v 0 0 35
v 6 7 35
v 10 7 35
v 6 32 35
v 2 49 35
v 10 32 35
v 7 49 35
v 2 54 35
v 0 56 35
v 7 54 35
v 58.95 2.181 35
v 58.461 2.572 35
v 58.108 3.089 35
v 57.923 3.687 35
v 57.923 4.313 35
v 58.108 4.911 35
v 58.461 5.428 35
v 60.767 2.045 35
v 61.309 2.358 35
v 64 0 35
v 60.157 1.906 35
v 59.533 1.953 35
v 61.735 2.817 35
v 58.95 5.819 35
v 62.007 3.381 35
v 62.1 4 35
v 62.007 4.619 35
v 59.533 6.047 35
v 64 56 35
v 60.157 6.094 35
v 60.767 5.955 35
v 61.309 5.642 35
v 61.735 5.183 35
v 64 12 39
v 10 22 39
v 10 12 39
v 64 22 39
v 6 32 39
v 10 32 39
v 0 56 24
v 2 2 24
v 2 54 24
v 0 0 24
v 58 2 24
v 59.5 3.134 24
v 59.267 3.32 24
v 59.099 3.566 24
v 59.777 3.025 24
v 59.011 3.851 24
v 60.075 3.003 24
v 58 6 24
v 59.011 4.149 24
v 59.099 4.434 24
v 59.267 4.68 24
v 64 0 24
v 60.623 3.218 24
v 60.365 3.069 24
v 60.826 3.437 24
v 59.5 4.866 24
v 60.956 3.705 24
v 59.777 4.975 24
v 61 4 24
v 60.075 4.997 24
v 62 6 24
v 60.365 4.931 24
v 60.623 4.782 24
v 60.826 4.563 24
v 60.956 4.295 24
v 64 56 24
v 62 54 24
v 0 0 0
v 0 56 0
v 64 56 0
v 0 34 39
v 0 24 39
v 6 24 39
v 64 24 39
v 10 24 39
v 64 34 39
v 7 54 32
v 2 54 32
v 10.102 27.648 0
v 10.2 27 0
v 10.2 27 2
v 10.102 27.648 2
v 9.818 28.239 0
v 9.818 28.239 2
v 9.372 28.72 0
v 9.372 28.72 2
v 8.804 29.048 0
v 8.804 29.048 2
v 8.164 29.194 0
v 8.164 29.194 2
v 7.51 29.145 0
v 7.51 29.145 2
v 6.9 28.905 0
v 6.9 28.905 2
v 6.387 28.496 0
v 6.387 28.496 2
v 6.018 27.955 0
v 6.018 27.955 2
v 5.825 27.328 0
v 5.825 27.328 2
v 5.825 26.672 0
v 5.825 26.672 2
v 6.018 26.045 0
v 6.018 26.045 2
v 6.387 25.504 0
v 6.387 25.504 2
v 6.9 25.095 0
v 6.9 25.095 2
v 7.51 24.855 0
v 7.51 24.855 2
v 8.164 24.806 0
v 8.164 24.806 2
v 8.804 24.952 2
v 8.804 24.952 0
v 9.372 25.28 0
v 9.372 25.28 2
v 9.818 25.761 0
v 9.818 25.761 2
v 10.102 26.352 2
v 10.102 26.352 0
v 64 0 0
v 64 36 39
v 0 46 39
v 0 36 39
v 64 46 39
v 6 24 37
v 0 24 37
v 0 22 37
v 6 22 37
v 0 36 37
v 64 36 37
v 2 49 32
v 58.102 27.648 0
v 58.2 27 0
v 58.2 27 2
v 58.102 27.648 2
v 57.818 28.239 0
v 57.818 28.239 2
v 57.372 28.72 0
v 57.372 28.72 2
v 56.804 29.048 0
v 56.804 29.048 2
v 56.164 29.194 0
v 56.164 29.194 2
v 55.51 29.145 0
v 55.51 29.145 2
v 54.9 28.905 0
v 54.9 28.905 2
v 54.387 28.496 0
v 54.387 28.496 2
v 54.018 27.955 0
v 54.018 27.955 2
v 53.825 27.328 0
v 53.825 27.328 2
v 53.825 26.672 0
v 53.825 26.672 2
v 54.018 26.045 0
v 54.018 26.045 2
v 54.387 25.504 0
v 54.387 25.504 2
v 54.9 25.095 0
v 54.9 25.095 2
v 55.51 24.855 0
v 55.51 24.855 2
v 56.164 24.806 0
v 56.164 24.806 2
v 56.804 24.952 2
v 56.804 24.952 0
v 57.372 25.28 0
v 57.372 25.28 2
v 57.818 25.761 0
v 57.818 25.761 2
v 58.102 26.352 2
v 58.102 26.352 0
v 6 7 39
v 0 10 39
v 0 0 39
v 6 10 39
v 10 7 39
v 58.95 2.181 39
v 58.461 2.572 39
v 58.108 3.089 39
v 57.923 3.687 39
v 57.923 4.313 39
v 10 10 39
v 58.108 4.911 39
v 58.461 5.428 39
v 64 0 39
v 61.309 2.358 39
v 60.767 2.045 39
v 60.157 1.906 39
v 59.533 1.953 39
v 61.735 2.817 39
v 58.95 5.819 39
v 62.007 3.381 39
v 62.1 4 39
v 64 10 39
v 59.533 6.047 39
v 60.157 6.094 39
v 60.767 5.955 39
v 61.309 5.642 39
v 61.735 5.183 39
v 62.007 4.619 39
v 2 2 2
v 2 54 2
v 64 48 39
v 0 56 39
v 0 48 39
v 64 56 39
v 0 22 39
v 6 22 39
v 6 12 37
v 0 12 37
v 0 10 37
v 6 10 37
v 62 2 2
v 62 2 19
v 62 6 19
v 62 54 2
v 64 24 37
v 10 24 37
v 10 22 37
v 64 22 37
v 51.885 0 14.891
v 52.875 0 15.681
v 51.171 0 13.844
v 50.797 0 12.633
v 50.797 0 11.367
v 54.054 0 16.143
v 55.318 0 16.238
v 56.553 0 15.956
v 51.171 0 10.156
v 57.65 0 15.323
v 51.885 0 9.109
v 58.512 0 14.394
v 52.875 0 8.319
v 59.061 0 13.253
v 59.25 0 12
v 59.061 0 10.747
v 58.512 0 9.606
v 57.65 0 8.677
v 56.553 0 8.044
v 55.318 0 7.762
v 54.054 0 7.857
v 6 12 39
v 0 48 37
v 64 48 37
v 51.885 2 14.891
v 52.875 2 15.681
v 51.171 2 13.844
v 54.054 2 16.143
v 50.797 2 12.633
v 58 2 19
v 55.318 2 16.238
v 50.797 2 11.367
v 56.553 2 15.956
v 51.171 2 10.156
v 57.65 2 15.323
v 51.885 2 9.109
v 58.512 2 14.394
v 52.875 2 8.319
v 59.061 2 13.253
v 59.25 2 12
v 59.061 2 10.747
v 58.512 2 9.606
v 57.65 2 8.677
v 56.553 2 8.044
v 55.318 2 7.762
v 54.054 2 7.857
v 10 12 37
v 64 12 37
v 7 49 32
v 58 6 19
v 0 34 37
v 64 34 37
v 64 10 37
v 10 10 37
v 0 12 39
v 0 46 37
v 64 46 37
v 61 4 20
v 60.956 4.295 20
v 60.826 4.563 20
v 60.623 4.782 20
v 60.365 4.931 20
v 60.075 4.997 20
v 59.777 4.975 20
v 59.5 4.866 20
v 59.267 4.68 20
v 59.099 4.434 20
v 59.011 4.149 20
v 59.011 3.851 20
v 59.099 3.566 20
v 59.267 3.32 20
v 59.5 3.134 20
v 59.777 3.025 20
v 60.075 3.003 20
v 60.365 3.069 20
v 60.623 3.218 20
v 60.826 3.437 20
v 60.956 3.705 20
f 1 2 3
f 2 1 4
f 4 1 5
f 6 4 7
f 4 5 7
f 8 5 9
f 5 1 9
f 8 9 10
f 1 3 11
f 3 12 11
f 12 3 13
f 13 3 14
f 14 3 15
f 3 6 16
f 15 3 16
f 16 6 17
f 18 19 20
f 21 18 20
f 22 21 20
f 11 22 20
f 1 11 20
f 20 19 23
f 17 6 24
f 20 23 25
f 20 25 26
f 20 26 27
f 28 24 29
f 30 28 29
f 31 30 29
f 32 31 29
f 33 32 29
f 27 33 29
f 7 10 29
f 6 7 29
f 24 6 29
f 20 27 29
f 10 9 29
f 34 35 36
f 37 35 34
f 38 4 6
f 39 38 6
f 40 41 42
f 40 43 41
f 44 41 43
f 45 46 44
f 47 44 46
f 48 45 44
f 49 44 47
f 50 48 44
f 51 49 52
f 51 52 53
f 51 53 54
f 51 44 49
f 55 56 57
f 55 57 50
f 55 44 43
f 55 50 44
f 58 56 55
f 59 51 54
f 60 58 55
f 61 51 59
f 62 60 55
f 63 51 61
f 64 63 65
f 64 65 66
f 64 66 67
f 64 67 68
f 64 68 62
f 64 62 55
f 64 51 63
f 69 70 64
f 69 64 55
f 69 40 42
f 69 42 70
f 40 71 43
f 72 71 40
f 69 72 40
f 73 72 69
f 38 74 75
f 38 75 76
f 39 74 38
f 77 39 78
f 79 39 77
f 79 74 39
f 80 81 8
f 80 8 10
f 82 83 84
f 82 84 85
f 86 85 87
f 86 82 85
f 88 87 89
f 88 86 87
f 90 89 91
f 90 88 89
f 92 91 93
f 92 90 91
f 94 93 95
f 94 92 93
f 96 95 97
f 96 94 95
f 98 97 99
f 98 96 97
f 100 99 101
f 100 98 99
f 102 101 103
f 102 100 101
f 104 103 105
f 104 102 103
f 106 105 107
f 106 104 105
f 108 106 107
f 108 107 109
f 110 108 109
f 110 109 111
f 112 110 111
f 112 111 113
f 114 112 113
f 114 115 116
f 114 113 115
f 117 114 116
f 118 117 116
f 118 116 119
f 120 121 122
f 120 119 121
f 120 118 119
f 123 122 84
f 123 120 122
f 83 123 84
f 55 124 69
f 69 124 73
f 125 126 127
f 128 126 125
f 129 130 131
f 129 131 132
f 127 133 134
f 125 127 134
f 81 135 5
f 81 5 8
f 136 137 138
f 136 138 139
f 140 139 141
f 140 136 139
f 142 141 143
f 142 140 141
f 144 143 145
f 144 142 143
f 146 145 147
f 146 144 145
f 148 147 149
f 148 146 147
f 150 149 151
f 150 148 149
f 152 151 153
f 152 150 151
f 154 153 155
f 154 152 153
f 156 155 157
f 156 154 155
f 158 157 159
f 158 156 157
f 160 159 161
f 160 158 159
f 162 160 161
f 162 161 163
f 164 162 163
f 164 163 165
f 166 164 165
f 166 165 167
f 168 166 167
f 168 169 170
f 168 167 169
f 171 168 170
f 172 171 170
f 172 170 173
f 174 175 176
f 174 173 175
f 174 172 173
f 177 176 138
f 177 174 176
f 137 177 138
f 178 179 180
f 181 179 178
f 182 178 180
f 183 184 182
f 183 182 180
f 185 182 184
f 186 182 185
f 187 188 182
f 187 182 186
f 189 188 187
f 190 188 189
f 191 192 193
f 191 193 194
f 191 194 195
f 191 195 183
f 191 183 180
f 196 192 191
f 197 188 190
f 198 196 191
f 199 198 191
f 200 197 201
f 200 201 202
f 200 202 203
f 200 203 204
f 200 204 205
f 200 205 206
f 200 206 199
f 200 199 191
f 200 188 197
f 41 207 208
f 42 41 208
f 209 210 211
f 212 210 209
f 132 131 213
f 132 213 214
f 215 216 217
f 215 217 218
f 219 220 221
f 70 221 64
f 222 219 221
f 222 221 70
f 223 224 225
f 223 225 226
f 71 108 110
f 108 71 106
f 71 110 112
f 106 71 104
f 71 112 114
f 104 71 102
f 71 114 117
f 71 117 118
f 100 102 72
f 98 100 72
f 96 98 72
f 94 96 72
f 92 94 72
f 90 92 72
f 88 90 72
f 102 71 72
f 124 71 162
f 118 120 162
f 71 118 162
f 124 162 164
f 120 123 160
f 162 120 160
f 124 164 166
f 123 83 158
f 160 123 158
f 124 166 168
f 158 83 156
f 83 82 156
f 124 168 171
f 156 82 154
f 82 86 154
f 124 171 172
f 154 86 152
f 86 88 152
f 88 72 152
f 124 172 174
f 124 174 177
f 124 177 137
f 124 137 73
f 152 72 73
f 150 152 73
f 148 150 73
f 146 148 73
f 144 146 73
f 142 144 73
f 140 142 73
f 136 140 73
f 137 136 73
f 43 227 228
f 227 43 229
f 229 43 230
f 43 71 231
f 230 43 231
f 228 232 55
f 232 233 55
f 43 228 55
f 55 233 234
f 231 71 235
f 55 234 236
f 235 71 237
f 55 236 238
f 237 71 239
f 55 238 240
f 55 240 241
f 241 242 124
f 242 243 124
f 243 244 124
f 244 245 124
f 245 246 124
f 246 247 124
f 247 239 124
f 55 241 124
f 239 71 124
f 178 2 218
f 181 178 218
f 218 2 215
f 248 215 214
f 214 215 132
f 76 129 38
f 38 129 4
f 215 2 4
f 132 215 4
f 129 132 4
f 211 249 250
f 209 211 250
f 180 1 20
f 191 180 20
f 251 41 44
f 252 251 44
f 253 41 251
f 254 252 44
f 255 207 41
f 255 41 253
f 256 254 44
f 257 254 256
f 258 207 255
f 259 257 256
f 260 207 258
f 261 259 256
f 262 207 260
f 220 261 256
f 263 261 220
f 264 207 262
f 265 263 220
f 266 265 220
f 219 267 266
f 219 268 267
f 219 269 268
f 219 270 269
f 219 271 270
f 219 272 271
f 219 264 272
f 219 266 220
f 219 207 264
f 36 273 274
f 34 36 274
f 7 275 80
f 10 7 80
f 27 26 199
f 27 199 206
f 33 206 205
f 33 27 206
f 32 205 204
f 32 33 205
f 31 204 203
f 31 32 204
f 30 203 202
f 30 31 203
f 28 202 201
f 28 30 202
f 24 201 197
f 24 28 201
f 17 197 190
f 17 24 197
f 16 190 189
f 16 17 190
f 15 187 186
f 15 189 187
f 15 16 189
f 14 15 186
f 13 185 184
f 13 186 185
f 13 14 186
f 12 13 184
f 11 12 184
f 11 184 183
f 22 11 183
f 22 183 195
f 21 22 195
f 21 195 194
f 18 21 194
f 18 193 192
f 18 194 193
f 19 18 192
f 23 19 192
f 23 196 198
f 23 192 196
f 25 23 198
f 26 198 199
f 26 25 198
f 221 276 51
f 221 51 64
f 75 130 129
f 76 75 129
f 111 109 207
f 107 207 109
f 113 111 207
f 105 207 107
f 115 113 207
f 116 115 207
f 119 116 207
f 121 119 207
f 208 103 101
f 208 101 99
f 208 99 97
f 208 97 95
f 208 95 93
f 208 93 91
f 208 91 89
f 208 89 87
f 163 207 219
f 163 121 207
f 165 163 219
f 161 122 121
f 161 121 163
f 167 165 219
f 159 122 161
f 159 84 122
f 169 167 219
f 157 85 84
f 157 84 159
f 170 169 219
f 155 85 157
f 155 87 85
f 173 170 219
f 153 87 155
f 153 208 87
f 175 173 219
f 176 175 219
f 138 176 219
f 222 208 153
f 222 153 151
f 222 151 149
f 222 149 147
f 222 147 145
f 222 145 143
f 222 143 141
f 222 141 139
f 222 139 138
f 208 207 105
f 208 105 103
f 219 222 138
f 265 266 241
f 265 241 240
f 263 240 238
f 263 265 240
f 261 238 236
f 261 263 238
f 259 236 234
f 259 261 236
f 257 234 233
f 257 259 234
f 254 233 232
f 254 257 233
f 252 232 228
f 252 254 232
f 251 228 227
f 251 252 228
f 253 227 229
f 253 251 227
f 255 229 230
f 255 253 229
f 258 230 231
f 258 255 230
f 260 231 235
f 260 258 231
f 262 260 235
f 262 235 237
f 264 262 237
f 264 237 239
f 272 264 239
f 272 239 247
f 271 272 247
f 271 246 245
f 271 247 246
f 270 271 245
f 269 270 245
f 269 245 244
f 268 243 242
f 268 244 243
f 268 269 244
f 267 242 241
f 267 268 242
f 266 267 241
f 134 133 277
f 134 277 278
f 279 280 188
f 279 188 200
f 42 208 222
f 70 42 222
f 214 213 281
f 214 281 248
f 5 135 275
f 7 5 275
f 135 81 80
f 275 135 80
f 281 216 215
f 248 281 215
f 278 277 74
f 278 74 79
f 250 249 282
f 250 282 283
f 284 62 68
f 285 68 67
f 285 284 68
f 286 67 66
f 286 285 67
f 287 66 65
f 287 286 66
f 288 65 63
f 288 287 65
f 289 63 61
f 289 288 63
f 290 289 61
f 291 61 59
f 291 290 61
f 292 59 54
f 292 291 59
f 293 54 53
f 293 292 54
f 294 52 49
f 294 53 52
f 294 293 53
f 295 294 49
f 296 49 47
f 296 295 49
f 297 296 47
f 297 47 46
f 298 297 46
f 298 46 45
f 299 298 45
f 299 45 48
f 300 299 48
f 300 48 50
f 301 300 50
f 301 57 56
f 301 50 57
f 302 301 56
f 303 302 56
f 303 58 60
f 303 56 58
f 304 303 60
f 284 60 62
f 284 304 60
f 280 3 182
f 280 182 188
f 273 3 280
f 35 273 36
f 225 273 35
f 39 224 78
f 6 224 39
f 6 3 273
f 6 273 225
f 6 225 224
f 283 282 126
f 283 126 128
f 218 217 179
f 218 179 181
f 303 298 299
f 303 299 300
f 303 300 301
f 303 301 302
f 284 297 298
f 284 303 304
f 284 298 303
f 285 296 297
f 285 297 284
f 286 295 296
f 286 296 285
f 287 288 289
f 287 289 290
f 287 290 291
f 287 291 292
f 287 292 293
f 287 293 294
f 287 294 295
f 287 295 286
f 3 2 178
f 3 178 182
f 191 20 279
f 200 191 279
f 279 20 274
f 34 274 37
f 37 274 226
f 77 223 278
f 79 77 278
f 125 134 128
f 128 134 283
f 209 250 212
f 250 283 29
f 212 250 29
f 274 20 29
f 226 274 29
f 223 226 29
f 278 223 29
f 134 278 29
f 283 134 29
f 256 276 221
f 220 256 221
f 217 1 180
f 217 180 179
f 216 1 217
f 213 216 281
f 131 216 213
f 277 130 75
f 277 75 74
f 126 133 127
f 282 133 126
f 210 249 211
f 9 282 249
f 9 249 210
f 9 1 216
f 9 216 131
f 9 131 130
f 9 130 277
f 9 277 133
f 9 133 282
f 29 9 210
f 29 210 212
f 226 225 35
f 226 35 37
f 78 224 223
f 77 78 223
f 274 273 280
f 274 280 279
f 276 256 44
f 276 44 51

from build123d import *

# Parameters (mm, degrees)
CYLINDER001_R     = 2.1
CYLINDER001_DEPTH = 10
BOX005_W          = 4
BOX005_H          = 25
BOX005_DEPTH      = 10
BOX006_W          = 64
BOX006_H          = 10
BOX006_DEPTH      = 2
BOX007_W          = 64
BOX007_H          = 8
BOX007_DEPTH      = 2
BOX008_W          = 64
BOX008_H          = 10
BOX008_DEPTH      = 2
BOX009_W          = 64
BOX009_H          = 10
BOX009_DEPTH      = 2
BOX010_W          = 64
BOX010_H          = 10
BOX010_DEPTH      = 2
BOX002_W          = 64
BOX002_H          = 56
BOX002_DEPTH      = 2
BOX003_W          = 5
BOX003_H          = 5
BOX003_DEPTH      = 5
CYLINDER004_R     = 2.2
CYLINDER004_DEPTH = 10
CYLINDER003_R     = 2.2
CYLINDER003_DEPTH = 10
CYLINDER002_R     = 1
CYLINDER002_DEPTH = 10
BOX004_W          = 5
BOX004_H          = 5
BOX004_DEPTH      = 5
CYLINDER_R        = 4.25
CYLINDER_DEPTH    = 10
BOX001_W          = 60
BOX001_H          = 52
BOX001_DEPTH      = 24
BOX_W             = 64
BOX_H             = 56
BOX_DEPTH         = 24


with BuildPart() as cylinder001:
    # Cylinder001 → Cylinder001 (new body)
    with BuildSketch(Plane(origin=(60, 4, 30), x_dir=(1, 0, 0), z_dir=(0, 0, 1))):
        Circle(CYLINDER001_R)
    extrude(amount=CYLINDER001_DEPTH)


with BuildPart() as cube005:
    # Box005 → Box005 (new body)
    with BuildSketch(Plane(origin=(6, 7, 33), x_dir=(1, 0, 0), z_dir=(0, 0, 1))):
        with Locations((2, 12.5)):
            Rectangle(BOX005_W, BOX005_H)
    extrude(amount=BOX005_DEPTH)


with BuildPart() as cube006:
    # Box006 → Box006 (new body)
    with BuildSketch(Plane.XY.offset(36)):
        with Locations((32, 5)):
            Rectangle(BOX006_W, BOX006_H)
    extrude(amount=BOX006_DEPTH)


with BuildPart() as cube007:
    # Box007 → Box007 (new body)
    with BuildSketch(Plane(origin=(0, 48, 36), x_dir=(1, 0, 0), z_dir=(0, 0, 1))):
        with Locations((32, 4)):
            Rectangle(BOX007_W, BOX007_H)
    extrude(amount=BOX007_DEPTH)


with BuildPart() as cube008:
    # Box008 → Box008 (new body)
    with BuildSketch(Plane(origin=(0, 12, 36), x_dir=(1, 0, 0), z_dir=(0, 0, 1))):
        with Locations((32, 5)):
            Rectangle(BOX008_W, BOX008_H)
    extrude(amount=BOX008_DEPTH)


with BuildPart() as cube009:
    # Box009 → Box009 (new body)
    with BuildSketch(Plane(origin=(0, 24, 36), x_dir=(1, 0, 0), z_dir=(0, 0, 1))):
        with Locations((32, 5)):
            Rectangle(BOX009_W, BOX009_H)
    extrude(amount=BOX009_DEPTH)


with BuildPart() as cube010:
    # Box010 → Box010 (new body)
    with BuildSketch(Plane(origin=(0, 36, 36), x_dir=(1, 0, 0), z_dir=(0, 0, 1))):
        with Locations((32, 5)):
            Rectangle(BOX010_W, BOX010_H)
    extrude(amount=BOX010_DEPTH)


with BuildPart() as cube002:
    # Box002 → Box002 (new body)
    with BuildSketch(Plane.XY.offset(34)):
        with Locations((32, 28)):
            Rectangle(BOX002_W, BOX002_H)
    extrude(amount=BOX002_DEPTH)


with BuildPart() as cut005:
    # Box003 → Box003 (new body)
    with BuildSketch(Plane(origin=(2, 49, 31), x_dir=(1, 0, 0), z_dir=(0, 0, 1))):
        with Locations((2.5, 2.5)):
            Rectangle(BOX003_W, BOX003_H)
    extrude(amount=BOX003_DEPTH)

    # Fusion: union Cube006, Cube007, Cube008, Cube009, Cube010, Cube002
    add(cube006.part)
    add(cube007.part)
    add(cube008.part)
    add(cube009.part)
    add(cube010.part)
    add(cube002.part)

    # Cut003: cut Cube005
    add(cube005.part, mode=Mode.SUBTRACT)


with BuildPart() as cut005_1:
    # Cut003 placement: moved
    add(cut005.part.moved(Location((0, 0, 1))))

    # Cut005: cut Cylinder001
    add(cylinder001.part, mode=Mode.SUBTRACT)


with BuildPart() as cylinder004:
    # Cylinder004 → Cylinder004 (new body)
    with BuildSketch(Plane(origin=(8, 27, -1), x_dir=(1, 0, 0), z_dir=(0, 0, 1))):
        Circle(CYLINDER004_R)
    extrude(amount=CYLINDER004_DEPTH)


with BuildPart() as cylinder003:
    # Cylinder003 → Cylinder003 (new body)
    with BuildSketch(Plane(origin=(56, 27, -1), x_dir=(1, 0, 0), z_dir=(0, 0, 1))):
        Circle(CYLINDER003_R)
    extrude(amount=CYLINDER003_DEPTH)


with BuildPart() as cylinder002:
    # Cylinder002 → Cylinder002 (new body)
    with BuildSketch(Plane(origin=(60, 4, 20), x_dir=(1, 0, 0), z_dir=(0, 0, 1))):
        Circle(CYLINDER002_R)
    extrude(amount=CYLINDER002_DEPTH)


with BuildPart() as cube004:
    # Box004 → Box004 (new body)
    with BuildSketch(Plane(origin=(58, 1, 19), x_dir=(1, 0, 0), z_dir=(0, 0, 1))):
        with Locations((2.5, 2.5)):
            Rectangle(BOX004_W, BOX004_H)
    extrude(amount=BOX004_DEPTH)


with BuildPart() as cylinder:
    # Cylinder → Cylinder (new body)
    with BuildSketch(Plane(origin=(55, 4, 12), x_dir=(1, 0, 0), z_dir=(0, -1, 0))):
        Circle(CYLINDER_R)
    extrude(amount=CYLINDER_DEPTH)


with BuildPart() as cube001:
    # Box001 → Box001 (new body)
    with BuildSketch(Plane(origin=(2, 2, 2), x_dir=(1, 0, 0), z_dir=(0, 0, 1))):
        with Locations((30, 26)):
            Rectangle(BOX001_W, BOX001_H)
    extrude(amount=BOX001_DEPTH)


with BuildPart() as cut007:
    # Box → Box (new body)
    with BuildSketch(Plane.XY):
        with Locations((32, 28)):
            Rectangle(BOX_W, BOX_H)
    extrude(amount=BOX_DEPTH)

    # Cut: cut Cube001
    add(cube001.part, mode=Mode.SUBTRACT)

    # Cut001: cut Cylinder
    add(cylinder.part, mode=Mode.SUBTRACT)

    # Fusion001: union Cube004
    add(cube004.part)

    # Cut004: cut Cylinder002
    add(cylinder002.part, mode=Mode.SUBTRACT)

    # Cut006: cut Cylinder003
    add(cylinder003.part, mode=Mode.SUBTRACT)

    # Cut007: cut Cylinder004
    add(cylinder004.part, mode=Mode.SUBTRACT)


solid = Compound([cut005_1.part, cut007.part])
